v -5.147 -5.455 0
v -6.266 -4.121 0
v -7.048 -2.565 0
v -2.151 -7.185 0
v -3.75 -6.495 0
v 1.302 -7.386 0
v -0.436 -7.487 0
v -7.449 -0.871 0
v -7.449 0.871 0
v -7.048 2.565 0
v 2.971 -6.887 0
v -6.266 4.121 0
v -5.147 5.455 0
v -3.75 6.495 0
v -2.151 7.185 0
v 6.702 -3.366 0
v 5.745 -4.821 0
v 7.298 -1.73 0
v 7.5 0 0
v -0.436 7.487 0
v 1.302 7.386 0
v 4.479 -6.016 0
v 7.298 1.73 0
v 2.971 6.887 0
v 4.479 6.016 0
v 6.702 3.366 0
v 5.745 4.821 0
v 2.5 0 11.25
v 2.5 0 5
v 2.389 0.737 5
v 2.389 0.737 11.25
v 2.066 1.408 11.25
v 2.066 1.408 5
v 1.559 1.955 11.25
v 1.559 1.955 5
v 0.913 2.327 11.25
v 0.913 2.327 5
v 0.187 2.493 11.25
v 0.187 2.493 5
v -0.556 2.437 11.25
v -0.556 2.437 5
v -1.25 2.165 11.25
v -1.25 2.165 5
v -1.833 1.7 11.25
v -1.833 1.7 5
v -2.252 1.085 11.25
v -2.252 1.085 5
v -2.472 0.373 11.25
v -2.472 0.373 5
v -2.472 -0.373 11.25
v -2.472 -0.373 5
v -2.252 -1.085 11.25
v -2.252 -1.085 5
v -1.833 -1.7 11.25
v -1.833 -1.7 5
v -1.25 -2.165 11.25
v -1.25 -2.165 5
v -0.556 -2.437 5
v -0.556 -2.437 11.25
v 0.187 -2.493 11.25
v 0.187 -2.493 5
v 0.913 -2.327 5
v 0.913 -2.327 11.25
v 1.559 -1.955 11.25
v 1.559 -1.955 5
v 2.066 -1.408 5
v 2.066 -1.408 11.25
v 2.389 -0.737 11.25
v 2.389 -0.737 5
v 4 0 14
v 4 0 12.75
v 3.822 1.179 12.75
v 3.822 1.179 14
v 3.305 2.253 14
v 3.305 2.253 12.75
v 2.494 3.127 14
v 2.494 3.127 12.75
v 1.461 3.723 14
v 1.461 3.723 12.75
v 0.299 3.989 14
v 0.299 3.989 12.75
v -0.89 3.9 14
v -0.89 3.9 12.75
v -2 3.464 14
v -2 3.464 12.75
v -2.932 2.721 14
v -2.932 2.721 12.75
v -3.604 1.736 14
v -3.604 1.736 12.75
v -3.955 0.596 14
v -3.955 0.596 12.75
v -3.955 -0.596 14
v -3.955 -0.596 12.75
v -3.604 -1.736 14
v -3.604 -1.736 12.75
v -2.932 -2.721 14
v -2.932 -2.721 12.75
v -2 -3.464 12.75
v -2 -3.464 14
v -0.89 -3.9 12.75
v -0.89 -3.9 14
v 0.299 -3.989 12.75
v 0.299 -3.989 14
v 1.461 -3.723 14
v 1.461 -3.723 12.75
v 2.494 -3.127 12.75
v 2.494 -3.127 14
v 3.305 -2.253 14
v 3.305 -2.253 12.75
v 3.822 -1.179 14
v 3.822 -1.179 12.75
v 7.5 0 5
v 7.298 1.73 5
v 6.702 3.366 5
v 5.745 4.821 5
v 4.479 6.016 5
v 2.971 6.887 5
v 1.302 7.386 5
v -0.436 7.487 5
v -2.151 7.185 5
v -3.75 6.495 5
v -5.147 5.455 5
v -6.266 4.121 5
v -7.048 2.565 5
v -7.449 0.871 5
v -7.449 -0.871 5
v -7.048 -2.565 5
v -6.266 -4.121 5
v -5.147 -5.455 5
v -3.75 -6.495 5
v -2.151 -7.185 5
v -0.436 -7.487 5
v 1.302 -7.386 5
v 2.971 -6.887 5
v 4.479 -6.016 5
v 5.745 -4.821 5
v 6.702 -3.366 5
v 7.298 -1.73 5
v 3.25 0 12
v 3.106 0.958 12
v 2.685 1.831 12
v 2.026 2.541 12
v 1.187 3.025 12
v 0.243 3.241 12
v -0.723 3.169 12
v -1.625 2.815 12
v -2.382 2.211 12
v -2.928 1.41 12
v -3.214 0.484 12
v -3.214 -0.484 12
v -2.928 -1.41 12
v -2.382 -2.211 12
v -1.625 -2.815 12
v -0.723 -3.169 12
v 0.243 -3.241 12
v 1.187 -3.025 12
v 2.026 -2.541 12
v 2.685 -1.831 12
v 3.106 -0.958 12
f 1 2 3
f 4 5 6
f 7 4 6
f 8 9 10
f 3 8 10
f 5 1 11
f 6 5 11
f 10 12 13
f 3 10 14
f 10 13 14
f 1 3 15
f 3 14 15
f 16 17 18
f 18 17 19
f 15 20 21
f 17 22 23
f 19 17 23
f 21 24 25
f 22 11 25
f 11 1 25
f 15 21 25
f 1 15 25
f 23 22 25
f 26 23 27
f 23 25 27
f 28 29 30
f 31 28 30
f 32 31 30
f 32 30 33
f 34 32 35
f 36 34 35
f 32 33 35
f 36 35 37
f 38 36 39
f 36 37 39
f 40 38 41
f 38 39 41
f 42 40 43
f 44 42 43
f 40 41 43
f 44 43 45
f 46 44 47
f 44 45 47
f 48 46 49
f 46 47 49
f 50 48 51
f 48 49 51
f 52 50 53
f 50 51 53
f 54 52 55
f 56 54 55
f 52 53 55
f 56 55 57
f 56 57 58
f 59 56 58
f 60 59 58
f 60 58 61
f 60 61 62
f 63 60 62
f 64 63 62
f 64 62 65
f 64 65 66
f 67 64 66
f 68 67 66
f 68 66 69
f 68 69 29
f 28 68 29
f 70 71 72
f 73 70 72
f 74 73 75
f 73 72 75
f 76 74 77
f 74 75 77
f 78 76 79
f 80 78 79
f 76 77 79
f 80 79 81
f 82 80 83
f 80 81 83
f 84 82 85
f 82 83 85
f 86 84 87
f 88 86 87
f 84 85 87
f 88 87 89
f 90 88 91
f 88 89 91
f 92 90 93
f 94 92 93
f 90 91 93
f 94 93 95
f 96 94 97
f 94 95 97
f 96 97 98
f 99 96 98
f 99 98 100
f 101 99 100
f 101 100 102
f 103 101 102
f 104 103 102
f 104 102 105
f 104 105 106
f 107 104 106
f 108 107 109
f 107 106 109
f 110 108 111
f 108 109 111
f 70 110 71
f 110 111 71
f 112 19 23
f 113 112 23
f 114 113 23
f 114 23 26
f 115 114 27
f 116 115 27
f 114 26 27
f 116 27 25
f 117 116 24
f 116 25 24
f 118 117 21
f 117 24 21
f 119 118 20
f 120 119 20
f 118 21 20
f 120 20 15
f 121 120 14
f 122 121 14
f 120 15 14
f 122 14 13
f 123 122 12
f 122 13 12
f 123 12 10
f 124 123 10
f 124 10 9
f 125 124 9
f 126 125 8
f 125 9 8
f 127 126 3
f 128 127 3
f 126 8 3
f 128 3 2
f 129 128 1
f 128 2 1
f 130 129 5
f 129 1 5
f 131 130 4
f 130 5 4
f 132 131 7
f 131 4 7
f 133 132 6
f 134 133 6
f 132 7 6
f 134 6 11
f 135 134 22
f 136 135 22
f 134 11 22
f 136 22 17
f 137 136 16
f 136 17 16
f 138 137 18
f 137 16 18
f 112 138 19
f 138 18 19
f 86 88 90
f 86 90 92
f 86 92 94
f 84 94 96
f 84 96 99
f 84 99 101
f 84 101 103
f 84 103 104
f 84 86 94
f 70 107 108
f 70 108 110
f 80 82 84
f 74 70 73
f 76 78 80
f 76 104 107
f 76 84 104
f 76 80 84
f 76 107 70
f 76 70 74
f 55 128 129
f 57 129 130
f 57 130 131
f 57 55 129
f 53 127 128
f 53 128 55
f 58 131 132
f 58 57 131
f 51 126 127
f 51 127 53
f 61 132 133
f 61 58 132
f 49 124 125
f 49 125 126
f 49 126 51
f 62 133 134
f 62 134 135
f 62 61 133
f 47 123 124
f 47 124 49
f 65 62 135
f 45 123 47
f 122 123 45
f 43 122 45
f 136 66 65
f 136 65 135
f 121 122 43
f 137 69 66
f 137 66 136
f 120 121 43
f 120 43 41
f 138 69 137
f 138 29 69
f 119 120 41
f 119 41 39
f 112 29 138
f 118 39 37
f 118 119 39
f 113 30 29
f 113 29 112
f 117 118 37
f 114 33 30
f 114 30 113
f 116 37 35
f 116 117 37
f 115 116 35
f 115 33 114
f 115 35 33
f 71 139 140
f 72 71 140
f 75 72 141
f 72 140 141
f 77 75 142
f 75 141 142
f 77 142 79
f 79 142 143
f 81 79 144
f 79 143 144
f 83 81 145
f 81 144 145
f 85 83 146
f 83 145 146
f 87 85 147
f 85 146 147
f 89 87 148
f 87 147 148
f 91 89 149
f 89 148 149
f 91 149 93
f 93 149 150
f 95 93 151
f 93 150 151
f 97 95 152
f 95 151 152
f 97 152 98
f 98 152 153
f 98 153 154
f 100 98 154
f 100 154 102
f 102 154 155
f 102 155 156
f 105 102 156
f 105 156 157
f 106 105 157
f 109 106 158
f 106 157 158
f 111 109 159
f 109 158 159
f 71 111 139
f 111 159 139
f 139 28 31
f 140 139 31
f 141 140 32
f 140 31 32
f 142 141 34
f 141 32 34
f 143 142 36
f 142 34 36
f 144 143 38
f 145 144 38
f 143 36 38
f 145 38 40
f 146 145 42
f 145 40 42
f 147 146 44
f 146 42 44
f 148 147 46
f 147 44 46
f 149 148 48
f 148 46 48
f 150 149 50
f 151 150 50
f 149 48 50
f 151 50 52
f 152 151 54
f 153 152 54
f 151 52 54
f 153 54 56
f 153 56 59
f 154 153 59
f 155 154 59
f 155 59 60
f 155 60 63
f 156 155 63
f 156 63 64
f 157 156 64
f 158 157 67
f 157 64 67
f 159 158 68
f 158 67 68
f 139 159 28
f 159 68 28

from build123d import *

# Parameters (mm, degrees)
F6_R      = 2.5
F7_DEPTH  = 12
F6_R_2    = 7.5
F8_DEPTH  = 5
F9_R      = 4
F9_R_2    = 2.5
F10_DEPTH = 2
F11_SIZE  = 0.74999


# Not quite as in the source:
# - a fillet or chamfer is up to 0.001 mm smaller than in the source, because OpenCascade refuses the exact size


with BuildPart() as f7:
    # F6 (on Top) → F7 (new body)
    with BuildSketch(Plane.XY):
        Circle(F6_R)
    extrude(amount=F7_DEPTH)

    # F6 (on Top) → F8 (join)
    with BuildSketch(Plane.XY):
        Circle(F6_R_2)
        Circle(F6_R, mode=Mode.SUBTRACT)
    extrude(amount=F8_DEPTH)

    # F9 (on face) → F10 (join)
    with BuildSketch(Plane.XY.offset(12)):
        Circle(F9_R)
        Circle(F9_R_2, mode=Mode.SUBTRACT)
        Circle(F9_R_2)
    extrude(amount=F10_DEPTH)

    # F11 (size 0.75 in the source; OpenCascade refuses exactly that, so slightly less here)
    f11_edges = [f7.edges().sort_by_distance(p)[0] for p in [
        (-4, 0, 12),
        (-2.5, 0, 12),
    ]]
    chamfer(f11_edges, length=F11_SIZE)


solid = f7.part
